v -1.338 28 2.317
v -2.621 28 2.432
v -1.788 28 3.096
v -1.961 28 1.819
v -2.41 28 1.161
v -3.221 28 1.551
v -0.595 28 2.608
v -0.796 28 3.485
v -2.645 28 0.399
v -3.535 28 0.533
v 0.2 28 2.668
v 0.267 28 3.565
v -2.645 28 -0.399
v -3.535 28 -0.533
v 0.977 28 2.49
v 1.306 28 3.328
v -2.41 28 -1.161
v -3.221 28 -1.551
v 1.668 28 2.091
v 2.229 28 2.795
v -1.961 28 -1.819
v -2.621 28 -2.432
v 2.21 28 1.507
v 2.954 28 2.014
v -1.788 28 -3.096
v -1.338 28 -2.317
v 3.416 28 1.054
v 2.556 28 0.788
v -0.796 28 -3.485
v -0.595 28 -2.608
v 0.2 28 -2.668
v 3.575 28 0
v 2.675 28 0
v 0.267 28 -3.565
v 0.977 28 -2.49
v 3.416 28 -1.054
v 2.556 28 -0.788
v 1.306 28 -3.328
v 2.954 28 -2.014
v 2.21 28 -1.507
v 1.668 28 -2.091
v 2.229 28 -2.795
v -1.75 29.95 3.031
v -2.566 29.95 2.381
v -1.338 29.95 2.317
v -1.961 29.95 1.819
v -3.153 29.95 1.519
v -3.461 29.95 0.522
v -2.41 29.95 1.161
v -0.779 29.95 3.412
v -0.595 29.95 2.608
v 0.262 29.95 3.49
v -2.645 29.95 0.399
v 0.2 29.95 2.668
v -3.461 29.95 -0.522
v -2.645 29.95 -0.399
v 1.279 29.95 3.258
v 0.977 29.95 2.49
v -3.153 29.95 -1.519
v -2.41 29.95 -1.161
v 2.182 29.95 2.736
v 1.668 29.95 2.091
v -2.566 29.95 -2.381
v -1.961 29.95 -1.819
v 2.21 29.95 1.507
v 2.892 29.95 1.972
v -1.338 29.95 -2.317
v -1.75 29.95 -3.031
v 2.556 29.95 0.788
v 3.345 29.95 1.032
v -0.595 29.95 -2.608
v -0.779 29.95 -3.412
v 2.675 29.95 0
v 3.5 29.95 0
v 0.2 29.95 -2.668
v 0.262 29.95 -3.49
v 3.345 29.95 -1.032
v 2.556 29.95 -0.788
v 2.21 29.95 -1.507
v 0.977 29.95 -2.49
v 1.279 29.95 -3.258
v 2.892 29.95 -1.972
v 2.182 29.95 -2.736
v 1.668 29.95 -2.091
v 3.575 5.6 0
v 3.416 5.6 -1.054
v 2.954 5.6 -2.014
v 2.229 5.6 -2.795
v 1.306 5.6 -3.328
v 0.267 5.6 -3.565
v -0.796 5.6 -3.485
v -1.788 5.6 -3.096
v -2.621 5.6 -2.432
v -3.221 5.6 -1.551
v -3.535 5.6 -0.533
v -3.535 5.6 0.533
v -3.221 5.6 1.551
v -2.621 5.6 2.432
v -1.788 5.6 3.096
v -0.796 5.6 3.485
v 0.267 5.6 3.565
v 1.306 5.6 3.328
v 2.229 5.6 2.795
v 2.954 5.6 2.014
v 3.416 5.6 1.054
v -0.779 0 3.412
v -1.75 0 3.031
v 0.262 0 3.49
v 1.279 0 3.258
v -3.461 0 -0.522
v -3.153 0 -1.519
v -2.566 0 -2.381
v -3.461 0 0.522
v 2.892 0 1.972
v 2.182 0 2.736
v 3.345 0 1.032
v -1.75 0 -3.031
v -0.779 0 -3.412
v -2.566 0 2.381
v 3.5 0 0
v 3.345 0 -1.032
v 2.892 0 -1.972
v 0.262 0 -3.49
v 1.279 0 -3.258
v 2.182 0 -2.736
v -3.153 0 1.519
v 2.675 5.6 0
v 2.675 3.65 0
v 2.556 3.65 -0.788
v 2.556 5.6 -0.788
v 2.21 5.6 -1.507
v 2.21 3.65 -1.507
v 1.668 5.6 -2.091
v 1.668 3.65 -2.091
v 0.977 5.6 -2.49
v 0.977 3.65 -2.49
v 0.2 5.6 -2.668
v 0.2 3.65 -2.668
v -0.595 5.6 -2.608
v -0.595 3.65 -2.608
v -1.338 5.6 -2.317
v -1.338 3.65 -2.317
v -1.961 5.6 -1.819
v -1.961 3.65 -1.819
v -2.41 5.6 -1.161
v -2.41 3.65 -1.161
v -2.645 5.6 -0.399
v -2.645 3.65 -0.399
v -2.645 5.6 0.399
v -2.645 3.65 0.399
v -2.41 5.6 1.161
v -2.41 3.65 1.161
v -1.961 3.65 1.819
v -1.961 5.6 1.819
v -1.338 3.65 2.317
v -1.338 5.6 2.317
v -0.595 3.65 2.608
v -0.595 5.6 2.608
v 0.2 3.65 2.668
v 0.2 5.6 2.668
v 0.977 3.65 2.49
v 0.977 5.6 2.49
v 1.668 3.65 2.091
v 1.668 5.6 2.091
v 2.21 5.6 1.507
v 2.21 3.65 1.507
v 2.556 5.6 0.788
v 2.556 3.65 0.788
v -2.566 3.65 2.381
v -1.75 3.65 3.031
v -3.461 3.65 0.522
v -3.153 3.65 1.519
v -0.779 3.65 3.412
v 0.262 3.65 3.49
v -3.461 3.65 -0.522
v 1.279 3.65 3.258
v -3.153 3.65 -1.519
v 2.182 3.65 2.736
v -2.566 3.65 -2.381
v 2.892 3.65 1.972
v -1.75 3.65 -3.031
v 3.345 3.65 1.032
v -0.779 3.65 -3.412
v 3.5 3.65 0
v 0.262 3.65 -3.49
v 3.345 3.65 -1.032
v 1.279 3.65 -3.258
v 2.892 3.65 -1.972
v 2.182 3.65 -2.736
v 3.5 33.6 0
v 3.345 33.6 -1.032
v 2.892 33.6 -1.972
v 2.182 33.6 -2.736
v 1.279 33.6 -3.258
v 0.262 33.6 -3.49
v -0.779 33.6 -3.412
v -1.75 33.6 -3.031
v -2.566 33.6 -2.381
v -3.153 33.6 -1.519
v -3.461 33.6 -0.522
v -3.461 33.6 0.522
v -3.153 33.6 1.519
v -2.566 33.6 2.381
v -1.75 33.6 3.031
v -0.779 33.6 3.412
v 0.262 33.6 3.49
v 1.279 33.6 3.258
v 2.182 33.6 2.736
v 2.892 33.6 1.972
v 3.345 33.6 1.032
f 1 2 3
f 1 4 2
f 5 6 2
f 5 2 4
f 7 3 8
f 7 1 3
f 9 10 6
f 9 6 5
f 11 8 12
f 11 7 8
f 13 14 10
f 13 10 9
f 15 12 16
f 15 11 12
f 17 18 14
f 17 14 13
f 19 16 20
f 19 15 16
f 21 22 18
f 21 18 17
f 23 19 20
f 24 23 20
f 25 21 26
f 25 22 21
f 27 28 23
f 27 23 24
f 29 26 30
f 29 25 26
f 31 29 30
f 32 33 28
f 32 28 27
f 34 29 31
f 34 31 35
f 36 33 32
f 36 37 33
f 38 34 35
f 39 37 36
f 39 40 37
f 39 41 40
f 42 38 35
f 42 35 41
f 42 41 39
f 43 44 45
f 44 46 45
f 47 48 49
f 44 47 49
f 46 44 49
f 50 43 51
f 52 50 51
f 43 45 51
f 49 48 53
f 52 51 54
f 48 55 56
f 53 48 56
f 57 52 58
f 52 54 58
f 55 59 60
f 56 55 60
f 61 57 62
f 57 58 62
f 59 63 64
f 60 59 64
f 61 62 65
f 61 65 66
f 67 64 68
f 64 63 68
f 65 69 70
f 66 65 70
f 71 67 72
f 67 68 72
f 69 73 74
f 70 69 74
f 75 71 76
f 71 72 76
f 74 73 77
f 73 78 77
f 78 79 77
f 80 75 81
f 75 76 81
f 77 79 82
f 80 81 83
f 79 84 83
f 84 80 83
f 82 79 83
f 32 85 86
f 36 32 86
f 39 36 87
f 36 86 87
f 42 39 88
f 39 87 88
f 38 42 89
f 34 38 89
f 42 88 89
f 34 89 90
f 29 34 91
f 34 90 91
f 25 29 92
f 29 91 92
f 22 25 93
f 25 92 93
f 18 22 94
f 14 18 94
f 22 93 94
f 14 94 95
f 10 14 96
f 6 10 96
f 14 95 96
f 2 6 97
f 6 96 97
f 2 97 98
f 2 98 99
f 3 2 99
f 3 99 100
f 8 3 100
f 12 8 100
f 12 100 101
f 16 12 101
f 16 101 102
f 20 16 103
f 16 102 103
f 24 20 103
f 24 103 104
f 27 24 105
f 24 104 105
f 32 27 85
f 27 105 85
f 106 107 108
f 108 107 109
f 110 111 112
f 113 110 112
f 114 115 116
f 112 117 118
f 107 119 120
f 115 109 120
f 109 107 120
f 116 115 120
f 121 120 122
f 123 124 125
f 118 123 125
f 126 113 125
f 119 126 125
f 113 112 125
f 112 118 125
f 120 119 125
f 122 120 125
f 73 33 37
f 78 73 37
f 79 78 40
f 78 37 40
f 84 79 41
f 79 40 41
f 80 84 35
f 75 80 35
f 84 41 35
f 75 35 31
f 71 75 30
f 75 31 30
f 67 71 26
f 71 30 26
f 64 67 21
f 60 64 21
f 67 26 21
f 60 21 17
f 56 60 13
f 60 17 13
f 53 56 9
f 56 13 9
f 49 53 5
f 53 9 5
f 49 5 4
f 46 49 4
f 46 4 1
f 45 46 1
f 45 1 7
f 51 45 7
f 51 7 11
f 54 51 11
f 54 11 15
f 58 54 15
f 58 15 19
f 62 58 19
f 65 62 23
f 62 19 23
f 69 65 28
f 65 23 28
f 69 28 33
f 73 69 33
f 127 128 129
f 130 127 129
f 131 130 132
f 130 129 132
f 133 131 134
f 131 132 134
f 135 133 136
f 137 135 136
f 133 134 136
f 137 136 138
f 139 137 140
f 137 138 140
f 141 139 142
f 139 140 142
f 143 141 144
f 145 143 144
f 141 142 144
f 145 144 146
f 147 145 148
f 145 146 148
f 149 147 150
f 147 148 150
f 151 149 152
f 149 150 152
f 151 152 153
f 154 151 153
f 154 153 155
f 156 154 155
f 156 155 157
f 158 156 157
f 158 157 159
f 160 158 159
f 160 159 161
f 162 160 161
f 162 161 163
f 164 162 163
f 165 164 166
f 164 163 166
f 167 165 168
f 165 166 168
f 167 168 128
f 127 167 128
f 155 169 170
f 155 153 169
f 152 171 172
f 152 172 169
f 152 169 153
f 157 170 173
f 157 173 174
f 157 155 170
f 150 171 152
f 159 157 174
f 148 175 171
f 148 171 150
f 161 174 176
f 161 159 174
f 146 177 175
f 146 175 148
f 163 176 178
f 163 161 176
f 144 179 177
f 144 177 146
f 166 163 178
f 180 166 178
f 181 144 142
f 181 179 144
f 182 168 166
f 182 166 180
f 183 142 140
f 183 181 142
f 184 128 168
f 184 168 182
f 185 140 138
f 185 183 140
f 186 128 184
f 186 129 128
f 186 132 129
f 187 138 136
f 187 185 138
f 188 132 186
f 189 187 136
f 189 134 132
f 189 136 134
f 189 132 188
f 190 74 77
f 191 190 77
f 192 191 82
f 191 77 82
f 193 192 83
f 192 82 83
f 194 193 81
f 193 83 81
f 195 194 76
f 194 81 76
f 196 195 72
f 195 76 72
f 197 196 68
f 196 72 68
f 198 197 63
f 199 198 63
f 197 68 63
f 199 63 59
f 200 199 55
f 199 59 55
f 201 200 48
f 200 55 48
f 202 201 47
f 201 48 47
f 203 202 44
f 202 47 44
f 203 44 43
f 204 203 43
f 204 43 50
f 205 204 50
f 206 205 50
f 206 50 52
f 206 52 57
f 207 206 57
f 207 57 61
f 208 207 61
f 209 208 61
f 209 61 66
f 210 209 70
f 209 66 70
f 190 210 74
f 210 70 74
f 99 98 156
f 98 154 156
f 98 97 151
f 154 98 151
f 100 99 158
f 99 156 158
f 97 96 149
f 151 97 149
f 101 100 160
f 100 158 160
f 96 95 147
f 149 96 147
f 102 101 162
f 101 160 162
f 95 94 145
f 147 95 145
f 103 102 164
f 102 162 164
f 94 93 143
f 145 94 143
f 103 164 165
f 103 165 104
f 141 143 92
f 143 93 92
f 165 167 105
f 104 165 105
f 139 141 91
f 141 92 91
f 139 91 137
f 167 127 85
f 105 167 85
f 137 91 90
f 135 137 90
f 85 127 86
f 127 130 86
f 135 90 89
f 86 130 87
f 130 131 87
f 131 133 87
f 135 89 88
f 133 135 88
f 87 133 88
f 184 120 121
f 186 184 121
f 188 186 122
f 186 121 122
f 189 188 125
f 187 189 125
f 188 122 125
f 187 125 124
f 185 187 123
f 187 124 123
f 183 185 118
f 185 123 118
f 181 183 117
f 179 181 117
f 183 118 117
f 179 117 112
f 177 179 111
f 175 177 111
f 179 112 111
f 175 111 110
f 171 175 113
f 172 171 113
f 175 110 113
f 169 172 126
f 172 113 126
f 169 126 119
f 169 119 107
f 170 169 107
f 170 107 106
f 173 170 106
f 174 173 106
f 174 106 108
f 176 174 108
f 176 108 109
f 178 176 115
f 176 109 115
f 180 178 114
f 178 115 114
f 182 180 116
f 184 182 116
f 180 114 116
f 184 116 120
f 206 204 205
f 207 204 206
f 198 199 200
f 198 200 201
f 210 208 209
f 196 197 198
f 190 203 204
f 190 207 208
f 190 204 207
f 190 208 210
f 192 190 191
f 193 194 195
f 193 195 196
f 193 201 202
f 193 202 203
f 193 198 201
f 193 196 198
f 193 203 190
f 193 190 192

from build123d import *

# Parameters (mm, degrees)
SKETCH2_R           = 3.5
BOSS_EXTRUDE1_DEPTH = 3.65
SKETCH3_R           = 2.675
BOSS_EXTRUDE2_DEPTH = 1.95
SKETCH4_R           = 3.575
BOSS_EXTRUDE3_DEPTH = 22.4
SKETCH5_R           = 2.675
BOSS_EXTRUDE4_DEPTH = 1.95
SKETCH6_R           = 3.5
BOSS_EXTRUDE5_DEPTH = 3.65


with BuildPart() as part:
    # Sketch2 → Boss-Extrude1 (new body)
    with BuildSketch(Plane(origin=(0, 0, 0), x_dir=(1, 0, 0), z_dir=(0, 1, 0))):
        Circle(SKETCH2_R)
    extrude(amount=BOSS_EXTRUDE1_DEPTH)

    # Sketch3 → Boss-Extrude2 (add)
    with BuildSketch(Plane(origin=(0, 3.65, 0), x_dir=(1, 0, 0), z_dir=(0, 1, 0))):
        Circle(SKETCH3_R)
    extrude(amount=BOSS_EXTRUDE2_DEPTH)

    # Sketch4 → Boss-Extrude3 (add)
    with BuildSketch(Plane(origin=(0, 5.6, 0), x_dir=(1, 0, 0), z_dir=(0, 1, 0))):
        Circle(SKETCH4_R)
    extrude(amount=BOSS_EXTRUDE3_DEPTH)

    # Sketch5 → Boss-Extrude4 (add)
    with BuildSketch(Plane(origin=(0, 28, 0), x_dir=(1, 0, 0), z_dir=(0, 1, 0))):
        Circle(SKETCH5_R)
    extrude(amount=BOSS_EXTRUDE4_DEPTH)

    # Sketch6 → Boss-Extrude5 (add)
    with BuildSketch(Plane(origin=(0, 29.95, 0), x_dir=(1, 0, 0), z_dir=(0, 1, 0))):
        Circle(SKETCH6_R)
    extrude(amount=BOSS_EXTRUDE5_DEPTH)


solid = part.part
